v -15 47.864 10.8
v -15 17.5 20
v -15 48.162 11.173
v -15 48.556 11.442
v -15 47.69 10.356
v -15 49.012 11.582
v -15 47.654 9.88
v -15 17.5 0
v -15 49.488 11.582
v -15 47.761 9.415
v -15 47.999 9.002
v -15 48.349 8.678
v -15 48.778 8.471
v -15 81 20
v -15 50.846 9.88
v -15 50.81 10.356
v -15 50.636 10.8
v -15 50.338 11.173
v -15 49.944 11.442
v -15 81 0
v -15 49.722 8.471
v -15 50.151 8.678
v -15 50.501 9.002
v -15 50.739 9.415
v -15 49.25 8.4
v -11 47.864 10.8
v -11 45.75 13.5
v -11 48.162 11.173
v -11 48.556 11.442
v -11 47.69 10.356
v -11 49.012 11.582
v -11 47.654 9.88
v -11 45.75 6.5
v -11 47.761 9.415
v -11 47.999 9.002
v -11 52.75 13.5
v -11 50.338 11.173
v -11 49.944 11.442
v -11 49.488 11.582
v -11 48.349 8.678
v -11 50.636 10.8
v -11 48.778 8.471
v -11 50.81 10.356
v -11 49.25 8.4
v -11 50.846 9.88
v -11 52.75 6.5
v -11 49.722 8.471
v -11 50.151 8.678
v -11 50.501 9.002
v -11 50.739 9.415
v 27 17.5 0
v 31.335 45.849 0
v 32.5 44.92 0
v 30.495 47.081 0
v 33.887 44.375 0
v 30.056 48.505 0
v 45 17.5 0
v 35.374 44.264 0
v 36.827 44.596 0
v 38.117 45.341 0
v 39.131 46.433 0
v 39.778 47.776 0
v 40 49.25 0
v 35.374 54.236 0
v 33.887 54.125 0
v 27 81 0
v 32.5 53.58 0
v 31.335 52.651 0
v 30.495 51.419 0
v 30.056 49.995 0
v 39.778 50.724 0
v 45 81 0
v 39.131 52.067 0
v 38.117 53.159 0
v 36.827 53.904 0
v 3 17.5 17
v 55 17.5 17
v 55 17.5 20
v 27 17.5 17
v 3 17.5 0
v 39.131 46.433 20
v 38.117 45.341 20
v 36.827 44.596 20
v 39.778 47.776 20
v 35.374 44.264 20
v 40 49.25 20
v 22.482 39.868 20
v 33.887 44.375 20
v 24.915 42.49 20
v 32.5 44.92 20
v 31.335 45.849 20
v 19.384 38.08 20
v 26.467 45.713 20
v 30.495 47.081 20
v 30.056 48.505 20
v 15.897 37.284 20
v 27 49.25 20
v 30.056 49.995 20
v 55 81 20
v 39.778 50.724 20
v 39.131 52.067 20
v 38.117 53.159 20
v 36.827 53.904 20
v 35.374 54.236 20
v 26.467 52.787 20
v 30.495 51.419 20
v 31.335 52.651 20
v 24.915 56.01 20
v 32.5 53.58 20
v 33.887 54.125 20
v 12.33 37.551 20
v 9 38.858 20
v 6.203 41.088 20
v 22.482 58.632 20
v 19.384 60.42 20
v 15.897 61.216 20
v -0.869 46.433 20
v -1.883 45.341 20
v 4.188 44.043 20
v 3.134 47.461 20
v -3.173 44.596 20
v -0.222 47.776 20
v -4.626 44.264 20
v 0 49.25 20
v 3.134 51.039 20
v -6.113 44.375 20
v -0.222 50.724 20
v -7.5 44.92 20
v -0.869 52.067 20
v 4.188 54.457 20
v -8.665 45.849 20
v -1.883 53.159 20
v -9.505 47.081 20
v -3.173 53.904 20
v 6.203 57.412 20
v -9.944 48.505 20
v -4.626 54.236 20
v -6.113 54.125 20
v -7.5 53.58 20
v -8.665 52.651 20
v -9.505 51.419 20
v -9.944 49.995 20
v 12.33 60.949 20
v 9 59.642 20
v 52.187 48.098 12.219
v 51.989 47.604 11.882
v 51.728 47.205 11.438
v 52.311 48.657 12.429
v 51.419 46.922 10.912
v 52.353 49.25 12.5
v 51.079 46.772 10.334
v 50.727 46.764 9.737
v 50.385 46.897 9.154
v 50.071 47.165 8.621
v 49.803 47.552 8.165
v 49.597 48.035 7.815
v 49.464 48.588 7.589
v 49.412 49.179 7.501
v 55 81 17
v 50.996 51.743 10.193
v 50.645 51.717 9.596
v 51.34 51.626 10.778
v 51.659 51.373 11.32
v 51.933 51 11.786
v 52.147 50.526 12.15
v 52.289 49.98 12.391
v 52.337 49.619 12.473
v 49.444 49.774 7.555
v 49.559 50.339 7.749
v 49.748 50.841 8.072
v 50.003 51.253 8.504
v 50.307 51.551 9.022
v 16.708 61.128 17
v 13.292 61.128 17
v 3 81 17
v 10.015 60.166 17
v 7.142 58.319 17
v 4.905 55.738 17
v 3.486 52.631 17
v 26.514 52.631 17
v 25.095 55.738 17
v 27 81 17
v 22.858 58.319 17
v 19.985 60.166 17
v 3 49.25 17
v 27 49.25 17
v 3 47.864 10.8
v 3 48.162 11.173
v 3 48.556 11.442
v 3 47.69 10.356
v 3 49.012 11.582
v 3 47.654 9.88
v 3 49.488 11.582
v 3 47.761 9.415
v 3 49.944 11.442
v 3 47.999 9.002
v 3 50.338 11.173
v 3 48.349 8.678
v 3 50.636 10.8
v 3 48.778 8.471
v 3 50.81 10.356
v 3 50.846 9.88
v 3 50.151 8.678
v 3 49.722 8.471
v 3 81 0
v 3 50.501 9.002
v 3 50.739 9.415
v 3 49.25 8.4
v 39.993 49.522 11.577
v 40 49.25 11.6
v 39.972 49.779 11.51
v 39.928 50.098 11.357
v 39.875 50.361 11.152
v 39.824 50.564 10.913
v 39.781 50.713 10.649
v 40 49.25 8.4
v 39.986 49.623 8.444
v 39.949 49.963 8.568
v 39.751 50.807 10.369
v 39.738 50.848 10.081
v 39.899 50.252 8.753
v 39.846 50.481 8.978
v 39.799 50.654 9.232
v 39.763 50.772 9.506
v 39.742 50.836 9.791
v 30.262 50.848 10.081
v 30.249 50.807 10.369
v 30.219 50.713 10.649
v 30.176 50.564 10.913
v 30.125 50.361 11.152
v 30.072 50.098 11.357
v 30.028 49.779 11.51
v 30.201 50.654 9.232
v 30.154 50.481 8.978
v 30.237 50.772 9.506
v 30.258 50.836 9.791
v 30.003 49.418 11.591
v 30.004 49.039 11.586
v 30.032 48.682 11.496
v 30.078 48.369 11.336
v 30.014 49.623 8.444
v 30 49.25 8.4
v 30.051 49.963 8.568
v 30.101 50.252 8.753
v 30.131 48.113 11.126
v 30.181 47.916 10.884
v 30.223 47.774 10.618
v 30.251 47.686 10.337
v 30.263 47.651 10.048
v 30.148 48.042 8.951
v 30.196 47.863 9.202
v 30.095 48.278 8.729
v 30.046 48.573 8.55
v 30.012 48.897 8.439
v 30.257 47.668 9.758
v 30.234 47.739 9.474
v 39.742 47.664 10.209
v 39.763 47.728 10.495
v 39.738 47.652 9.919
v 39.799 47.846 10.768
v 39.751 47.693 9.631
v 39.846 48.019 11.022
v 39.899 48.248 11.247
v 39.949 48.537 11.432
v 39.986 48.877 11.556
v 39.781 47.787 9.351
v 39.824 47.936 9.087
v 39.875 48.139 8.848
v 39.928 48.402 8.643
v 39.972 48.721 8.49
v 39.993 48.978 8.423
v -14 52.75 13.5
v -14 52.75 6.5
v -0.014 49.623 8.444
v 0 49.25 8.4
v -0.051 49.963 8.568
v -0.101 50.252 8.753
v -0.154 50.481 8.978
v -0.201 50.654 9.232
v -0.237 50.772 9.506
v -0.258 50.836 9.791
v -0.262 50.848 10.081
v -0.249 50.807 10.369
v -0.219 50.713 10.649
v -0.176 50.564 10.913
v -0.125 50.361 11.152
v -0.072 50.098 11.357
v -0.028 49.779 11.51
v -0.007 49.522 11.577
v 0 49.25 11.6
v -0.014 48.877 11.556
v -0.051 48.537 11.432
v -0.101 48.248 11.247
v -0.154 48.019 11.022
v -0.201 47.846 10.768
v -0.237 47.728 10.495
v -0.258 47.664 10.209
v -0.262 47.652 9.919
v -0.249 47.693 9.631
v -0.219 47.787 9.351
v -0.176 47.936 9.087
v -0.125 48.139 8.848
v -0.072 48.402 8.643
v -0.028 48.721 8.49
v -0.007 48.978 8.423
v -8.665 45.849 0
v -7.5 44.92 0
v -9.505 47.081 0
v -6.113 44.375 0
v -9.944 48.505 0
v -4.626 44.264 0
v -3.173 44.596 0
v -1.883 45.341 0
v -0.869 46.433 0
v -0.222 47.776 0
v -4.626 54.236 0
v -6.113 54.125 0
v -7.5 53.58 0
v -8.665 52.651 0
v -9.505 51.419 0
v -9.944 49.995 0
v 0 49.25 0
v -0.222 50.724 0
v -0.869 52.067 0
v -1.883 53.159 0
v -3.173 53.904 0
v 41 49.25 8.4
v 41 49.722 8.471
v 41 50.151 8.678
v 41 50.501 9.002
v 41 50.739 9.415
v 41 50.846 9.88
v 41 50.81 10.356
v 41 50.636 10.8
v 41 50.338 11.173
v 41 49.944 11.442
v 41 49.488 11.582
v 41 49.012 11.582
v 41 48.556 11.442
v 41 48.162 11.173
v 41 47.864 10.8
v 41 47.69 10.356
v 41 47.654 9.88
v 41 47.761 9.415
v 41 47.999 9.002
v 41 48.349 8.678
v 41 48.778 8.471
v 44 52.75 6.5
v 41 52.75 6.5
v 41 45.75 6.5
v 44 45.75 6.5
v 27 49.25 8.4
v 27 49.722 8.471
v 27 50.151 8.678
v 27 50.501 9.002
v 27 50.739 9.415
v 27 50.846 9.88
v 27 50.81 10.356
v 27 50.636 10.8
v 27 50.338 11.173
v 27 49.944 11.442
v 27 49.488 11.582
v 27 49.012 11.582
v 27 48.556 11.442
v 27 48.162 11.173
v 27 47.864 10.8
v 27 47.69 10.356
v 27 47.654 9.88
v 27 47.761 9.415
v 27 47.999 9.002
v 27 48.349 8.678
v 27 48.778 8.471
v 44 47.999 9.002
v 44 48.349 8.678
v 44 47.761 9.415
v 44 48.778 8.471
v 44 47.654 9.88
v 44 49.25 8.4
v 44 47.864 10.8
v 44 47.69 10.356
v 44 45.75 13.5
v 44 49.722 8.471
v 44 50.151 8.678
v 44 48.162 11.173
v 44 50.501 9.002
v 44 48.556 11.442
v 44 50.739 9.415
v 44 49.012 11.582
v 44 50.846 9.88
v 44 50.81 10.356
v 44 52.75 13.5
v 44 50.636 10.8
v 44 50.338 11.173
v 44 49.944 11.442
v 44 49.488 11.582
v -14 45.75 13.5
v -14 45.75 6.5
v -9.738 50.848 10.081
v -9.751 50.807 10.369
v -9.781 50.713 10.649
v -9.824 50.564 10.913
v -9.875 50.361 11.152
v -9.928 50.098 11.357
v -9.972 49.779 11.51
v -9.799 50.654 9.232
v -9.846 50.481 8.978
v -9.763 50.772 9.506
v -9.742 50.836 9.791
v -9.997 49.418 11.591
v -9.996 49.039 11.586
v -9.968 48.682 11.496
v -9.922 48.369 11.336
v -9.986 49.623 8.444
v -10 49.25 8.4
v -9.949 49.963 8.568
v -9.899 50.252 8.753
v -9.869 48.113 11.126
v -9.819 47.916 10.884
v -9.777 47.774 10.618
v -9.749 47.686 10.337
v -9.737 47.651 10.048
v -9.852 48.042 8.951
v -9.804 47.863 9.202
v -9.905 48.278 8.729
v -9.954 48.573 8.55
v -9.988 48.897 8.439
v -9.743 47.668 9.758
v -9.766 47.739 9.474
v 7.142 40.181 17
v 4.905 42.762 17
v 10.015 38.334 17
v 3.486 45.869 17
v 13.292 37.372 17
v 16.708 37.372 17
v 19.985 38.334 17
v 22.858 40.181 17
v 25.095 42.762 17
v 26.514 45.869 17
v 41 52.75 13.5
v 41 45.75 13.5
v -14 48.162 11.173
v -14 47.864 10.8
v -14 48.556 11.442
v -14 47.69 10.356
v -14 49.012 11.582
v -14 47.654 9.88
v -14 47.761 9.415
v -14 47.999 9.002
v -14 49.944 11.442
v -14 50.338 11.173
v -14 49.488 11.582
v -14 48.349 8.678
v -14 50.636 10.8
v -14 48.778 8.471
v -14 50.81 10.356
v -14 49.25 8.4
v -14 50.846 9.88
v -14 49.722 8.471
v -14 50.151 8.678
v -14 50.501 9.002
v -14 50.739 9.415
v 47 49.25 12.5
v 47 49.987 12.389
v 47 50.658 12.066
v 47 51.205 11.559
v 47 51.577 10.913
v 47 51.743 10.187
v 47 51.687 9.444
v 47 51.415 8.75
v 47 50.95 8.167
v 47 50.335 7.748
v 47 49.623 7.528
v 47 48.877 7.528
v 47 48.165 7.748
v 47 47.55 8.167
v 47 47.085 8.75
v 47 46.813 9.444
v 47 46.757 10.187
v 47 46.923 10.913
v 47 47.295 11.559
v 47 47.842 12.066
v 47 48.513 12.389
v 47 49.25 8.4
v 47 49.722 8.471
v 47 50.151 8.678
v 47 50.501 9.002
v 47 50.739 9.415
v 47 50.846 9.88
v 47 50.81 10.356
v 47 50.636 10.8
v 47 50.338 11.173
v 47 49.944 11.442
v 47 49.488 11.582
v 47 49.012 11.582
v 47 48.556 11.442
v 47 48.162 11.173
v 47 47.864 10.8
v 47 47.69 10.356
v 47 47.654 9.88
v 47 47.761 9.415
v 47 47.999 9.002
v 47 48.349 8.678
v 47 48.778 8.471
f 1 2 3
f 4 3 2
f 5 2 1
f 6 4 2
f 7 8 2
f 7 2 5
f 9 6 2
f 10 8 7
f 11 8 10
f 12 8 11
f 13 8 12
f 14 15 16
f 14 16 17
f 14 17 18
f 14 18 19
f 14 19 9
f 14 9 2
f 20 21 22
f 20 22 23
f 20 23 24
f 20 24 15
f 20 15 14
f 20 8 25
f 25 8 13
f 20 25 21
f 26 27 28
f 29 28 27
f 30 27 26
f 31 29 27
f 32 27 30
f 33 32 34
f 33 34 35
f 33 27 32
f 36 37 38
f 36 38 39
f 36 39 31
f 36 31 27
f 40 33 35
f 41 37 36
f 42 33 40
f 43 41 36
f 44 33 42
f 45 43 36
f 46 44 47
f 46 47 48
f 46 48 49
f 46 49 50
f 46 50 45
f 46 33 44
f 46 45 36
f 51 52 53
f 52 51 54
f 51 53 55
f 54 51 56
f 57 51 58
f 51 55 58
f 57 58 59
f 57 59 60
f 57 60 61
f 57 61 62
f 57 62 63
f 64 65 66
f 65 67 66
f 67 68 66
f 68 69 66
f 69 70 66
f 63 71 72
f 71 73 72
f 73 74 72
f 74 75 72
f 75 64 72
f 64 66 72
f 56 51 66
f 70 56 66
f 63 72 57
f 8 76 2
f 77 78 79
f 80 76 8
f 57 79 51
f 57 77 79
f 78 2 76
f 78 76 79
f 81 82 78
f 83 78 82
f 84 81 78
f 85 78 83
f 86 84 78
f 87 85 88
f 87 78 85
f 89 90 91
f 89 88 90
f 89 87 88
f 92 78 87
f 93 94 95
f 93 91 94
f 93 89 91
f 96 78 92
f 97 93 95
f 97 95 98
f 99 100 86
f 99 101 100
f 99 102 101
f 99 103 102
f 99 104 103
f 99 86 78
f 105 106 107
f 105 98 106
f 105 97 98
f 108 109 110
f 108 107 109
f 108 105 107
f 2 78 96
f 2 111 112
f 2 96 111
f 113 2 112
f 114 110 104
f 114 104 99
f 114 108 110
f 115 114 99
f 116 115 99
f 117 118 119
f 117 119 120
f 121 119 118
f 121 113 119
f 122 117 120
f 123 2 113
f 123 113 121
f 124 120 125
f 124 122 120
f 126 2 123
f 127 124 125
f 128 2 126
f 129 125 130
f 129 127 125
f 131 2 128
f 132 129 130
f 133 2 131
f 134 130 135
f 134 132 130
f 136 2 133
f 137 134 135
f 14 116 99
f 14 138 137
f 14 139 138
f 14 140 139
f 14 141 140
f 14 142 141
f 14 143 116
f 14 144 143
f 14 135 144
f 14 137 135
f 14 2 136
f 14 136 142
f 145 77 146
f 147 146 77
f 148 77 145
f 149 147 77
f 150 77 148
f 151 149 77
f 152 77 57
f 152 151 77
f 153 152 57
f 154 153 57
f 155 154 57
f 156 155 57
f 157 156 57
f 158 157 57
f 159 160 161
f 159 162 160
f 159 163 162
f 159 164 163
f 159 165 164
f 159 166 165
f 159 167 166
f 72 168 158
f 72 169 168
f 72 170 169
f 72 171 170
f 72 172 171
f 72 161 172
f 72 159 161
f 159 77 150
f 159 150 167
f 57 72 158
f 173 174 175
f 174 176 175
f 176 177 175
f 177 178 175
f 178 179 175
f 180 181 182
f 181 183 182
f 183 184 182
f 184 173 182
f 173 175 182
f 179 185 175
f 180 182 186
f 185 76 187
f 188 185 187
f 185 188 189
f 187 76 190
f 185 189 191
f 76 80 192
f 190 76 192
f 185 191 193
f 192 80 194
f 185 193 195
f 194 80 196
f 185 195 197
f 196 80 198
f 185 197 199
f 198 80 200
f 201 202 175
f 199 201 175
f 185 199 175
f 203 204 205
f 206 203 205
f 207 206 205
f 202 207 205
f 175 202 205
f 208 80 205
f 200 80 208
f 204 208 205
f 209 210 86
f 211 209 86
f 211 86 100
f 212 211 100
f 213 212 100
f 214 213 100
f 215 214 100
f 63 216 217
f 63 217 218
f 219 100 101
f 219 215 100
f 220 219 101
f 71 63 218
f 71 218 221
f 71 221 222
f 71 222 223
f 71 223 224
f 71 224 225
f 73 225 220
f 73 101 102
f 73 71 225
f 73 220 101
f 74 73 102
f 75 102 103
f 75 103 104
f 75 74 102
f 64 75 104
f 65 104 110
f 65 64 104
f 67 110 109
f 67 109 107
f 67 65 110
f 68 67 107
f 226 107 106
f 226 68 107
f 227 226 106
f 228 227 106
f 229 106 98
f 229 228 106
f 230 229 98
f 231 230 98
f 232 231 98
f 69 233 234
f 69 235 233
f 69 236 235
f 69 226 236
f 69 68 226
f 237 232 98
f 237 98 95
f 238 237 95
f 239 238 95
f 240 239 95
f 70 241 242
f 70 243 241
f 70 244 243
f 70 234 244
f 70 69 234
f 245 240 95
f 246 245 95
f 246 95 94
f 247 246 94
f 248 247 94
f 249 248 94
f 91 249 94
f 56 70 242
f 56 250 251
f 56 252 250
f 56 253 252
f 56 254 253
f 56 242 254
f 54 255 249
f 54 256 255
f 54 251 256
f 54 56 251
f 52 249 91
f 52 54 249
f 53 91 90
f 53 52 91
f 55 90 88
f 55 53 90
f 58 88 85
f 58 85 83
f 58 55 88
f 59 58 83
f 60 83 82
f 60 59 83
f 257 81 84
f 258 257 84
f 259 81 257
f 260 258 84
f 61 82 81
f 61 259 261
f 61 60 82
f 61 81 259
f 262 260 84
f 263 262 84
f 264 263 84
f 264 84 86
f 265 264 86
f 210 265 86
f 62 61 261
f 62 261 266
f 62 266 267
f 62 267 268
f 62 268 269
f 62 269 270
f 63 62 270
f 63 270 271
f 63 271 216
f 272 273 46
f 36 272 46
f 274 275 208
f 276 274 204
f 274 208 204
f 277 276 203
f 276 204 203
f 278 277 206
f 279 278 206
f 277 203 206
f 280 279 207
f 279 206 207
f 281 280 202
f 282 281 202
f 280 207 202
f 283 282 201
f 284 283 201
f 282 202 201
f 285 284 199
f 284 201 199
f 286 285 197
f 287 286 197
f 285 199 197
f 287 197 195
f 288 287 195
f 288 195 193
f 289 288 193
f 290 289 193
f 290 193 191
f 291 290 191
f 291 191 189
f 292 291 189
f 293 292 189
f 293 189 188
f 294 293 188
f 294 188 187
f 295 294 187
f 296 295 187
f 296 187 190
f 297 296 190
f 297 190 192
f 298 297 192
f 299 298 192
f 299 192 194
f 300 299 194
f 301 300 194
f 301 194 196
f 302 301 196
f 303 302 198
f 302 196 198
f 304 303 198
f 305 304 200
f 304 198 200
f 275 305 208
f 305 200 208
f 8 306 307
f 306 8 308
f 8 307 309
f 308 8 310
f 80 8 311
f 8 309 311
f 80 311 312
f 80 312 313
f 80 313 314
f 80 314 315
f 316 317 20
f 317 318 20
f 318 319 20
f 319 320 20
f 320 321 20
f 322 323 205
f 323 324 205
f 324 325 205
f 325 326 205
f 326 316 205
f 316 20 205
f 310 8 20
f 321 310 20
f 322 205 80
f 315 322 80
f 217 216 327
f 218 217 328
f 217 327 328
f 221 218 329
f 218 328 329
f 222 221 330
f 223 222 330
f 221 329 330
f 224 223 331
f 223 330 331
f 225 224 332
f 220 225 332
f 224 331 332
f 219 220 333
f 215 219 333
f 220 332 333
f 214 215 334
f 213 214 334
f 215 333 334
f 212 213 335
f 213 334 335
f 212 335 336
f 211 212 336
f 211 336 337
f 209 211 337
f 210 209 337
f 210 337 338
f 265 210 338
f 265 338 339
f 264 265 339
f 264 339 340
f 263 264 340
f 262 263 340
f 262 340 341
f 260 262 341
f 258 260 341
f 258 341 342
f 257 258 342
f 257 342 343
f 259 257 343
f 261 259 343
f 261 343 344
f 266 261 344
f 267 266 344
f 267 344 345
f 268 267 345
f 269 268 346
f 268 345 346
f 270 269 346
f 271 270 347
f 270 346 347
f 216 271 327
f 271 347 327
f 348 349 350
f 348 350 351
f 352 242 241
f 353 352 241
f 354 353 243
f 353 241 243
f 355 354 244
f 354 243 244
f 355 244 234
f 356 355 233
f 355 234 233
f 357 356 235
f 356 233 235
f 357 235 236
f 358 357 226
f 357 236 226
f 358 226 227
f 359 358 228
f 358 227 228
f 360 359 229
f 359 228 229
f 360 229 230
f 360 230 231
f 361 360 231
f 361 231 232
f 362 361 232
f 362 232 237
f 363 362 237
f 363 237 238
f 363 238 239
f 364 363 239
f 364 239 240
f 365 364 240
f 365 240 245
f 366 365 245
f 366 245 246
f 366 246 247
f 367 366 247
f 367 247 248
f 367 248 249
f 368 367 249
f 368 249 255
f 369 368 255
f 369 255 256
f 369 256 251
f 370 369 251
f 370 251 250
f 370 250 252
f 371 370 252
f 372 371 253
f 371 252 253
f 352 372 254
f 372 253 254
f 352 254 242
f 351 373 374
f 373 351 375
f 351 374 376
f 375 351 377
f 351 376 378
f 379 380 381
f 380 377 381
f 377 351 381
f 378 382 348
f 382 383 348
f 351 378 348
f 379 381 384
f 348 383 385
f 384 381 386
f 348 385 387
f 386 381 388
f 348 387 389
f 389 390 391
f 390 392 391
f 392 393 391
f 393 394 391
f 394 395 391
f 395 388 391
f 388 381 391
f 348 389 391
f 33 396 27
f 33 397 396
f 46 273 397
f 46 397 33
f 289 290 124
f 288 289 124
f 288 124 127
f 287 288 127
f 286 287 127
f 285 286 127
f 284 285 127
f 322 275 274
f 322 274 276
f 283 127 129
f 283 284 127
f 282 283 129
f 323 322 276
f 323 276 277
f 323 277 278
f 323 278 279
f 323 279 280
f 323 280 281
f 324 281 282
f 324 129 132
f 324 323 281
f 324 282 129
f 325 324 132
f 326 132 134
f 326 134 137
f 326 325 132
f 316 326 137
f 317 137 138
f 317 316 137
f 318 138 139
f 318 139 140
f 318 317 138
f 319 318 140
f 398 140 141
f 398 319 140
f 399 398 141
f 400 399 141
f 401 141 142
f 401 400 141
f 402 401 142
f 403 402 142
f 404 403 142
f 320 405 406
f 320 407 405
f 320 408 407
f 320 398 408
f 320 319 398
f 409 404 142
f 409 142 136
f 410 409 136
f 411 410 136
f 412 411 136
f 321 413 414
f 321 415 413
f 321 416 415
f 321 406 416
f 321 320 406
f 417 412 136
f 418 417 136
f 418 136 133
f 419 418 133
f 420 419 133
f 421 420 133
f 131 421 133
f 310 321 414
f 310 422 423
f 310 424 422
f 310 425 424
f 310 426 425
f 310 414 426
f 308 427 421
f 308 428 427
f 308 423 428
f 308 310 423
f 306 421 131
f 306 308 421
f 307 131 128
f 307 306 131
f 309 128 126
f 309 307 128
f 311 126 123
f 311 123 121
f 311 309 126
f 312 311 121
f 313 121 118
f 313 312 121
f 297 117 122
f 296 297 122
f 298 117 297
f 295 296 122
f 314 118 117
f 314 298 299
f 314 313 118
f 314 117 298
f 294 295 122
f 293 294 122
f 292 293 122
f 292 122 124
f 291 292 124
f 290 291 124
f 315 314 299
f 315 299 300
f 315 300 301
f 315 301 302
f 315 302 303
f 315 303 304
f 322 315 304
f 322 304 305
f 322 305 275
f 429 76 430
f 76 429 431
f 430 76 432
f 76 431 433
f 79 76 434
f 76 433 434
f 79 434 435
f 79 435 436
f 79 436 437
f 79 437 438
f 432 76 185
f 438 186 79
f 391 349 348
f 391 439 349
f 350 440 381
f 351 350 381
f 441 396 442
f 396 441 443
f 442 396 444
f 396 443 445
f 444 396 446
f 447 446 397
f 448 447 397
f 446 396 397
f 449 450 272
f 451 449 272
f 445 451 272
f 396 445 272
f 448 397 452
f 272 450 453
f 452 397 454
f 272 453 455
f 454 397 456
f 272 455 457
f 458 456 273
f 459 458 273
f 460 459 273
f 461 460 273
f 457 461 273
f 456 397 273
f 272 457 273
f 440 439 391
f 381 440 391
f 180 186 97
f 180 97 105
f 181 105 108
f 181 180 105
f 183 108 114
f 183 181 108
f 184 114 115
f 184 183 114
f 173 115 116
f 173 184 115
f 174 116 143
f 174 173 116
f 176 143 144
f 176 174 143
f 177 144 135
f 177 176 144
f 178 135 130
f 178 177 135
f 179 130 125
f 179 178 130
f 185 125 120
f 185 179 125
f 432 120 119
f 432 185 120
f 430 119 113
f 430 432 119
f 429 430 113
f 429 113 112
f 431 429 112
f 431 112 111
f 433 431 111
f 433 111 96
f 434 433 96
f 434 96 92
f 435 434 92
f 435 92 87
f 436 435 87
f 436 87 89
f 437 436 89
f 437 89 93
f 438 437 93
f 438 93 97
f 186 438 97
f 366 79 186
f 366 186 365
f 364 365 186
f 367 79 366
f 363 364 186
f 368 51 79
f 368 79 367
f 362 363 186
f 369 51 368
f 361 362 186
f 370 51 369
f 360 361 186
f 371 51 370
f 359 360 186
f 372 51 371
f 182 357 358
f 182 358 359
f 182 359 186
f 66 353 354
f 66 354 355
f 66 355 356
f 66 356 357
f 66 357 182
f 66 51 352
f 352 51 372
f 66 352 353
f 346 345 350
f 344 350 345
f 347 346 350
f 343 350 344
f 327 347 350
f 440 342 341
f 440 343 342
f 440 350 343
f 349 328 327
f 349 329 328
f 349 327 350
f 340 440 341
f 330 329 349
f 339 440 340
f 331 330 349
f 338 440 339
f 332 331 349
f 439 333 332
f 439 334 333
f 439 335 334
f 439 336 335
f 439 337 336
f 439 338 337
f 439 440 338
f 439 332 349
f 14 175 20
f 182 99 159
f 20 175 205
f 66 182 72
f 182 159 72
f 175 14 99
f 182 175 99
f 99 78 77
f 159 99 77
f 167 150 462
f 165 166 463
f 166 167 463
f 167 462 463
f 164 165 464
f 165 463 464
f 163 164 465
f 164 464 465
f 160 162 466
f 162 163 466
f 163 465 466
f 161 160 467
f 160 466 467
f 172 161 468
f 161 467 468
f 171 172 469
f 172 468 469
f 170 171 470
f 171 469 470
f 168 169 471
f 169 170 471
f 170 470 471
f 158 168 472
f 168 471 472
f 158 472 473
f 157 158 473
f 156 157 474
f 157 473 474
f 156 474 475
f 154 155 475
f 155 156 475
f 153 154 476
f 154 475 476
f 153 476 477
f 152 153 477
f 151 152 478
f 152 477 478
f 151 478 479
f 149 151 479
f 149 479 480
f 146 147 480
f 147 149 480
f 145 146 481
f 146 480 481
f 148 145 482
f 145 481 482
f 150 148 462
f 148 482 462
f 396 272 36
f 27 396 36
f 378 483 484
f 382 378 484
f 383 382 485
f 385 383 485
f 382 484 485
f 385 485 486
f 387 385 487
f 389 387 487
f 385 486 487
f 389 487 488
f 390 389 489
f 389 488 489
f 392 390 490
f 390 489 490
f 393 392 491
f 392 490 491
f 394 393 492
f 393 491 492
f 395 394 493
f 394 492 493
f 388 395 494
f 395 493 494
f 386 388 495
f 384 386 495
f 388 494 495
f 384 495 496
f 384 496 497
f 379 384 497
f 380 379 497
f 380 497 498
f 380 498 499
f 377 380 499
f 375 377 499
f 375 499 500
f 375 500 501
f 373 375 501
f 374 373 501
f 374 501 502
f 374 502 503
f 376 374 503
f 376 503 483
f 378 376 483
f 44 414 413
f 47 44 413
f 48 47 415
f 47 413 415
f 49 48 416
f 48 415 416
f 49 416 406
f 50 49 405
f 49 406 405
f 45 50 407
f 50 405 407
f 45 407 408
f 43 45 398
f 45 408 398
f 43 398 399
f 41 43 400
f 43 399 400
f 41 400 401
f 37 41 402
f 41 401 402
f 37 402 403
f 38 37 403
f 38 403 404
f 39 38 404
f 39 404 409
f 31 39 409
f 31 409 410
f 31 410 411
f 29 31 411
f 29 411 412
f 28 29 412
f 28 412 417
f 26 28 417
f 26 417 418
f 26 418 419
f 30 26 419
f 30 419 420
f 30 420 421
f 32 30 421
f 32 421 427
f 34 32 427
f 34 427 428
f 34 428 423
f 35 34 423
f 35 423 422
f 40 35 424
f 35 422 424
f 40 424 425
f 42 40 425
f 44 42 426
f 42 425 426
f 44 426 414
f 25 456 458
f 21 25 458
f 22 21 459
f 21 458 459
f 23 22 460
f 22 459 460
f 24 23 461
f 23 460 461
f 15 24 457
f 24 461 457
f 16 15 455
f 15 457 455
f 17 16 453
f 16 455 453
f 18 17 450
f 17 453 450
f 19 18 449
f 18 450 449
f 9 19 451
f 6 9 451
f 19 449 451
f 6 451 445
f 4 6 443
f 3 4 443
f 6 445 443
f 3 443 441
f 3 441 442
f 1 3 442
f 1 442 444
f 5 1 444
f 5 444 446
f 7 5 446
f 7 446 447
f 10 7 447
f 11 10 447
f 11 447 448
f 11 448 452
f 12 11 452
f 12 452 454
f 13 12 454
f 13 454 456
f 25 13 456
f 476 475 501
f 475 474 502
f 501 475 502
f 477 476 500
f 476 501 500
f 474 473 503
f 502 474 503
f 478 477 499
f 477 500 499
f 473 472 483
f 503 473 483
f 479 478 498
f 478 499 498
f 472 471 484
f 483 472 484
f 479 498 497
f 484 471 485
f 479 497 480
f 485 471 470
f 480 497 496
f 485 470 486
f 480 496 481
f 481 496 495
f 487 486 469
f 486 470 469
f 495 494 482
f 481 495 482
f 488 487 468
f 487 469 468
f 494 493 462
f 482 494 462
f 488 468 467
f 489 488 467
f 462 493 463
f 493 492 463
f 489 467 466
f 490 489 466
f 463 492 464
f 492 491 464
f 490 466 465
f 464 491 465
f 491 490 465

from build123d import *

# Parameters (mm, degrees)
SKETCH_1_W          = 18
SKETCH_1_H          = 63.5
SKETCH_1_R          = 5
EXTRUDE_1_DEPTH     = 17
EXTRUDE_1_2_DEPTH   = 17
SKETCH_2_W          = 60
SKETCH_2_H          = 63.5
SKETCH_2_R          = 5
SKETCH_2_R_2        = 12
EXTRUDE_2_DEPTH     = 3
SKETCH_3_W          = 3
SKETCH_3_H          = 63.5
EXTRUDE_3_DEPTH     = 10
RIB_1_REACH         = 88.355
SKETCH_4_WALL_W     = 194.433823758
SKETCH_4_WALL_H     = 63.5
SKETCH_7_W          = 3
SKETCH_7_H          = 7
CUT_EXTRUDE_1_DEPTH = 3.5
HOLE_WIZARD_1_D     = 3.2
SKETCH_13_R         = 2.5
CUT_EXTRUDE_2_DEPTH = 11


with BuildPart() as part:
    # 草图1 → 凸台-拉伸1 (new body)
    with BuildSketch(Plane.XY):
        with Locations((36, 49.25)):
            Rectangle(SKETCH_1_W, SKETCH_1_H)
        with Locations((35, 49.25)):
            Circle(SKETCH_1_R, mode=Mode.SUBTRACT)
    extrude(amount=EXTRUDE_1_DEPTH)



with BuildPart() as body_2:
    # 草图1 → Extrude 1 2 (new body)
    with BuildSketch(Plane.XY):
        with Locations((-6, 49.25)):
            Rectangle(SKETCH_1_W, SKETCH_1_H)
        with Locations((-5, 49.25)):
            Circle(SKETCH_1_R, mode=Mode.SUBTRACT)
    extrude(amount=EXTRUDE_1_2_DEPTH)


with BuildPart() as part_1:
    add(part.part)

    add(body_2.part)  # 凸台-拉伸2 merges body 2
    # 草图2 → 凸台-拉伸2 (add)
    with BuildSketch(Plane.XY.offset(17)):
        with Locations((15, 49.25)):
            Rectangle(SKETCH_2_W, SKETCH_2_H)
        with Locations((35, 49.25)):
            Circle(SKETCH_2_R, mode=Mode.SUBTRACT)
        with Locations((-5, 49.25)):
            Circle(SKETCH_2_R, mode=Mode.SUBTRACT)
        with Locations((15, 49.25)):
            Circle(SKETCH_2_R_2, mode=Mode.SUBTRACT)
    extrude(amount=EXTRUDE_2_DEPTH)

    # 草图3 → 凸台-拉伸3 (add)
    with BuildSketch(Plane(origin=(45, 0, 0), x_dir=(0, 0, -1), z_dir=(1, 0, 0))):
        with Locations((-18.5, 49.25)):
            Rectangle(SKETCH_3_W, SKETCH_3_H)
    extrude(amount=EXTRUDE_3_DEPTH)

    # 草图4 wall → 筋1 (add, up to next)
    with BuildSketch(Plane(origin=(50, 17.5, 8.5), x_dir=(-0.507020126563, 0, -0.861934215158), z_dir=(0.861934215158, 0, -0.507020126563)), mode=Mode.PRIVATE) as rib_1_sk1:
        with Locations((0, 31.75)):
            Rectangle(SKETCH_4_WALL_W, SKETCH_4_WALL_H)
    rib_1_tool1 = extrude(rib_1_sk1.sketch, amount=-RIB_1_REACH, mode=Mode.PRIVATE) - part_1.part
    add(rib_1_tool1.solids().sort_by_distance((50, 17.5, 8.5))[0])

    # 草图7 → 切除-拉伸1 (cut, symmetric)
    with BuildSketch(Plane.XY.offset(10)):
        with Locations((-12.5, 49.25)):
            Rectangle(SKETCH_7_W, SKETCH_7_H)
        with Locations((42.5, 49.25)):
            Rectangle(SKETCH_7_W, SKETCH_7_H)
    extrude(amount=CUT_EXTRUDE_1_DEPTH, both=True, mode=Mode.SUBTRACT)

    # 孔1 (through all)
    with Locations(Plane.ZY.offset(15)):
        with Locations((10, 49.25)):
            Hole(HOLE_WIZARD_1_D / 2)

    # 草图13 → 切除-拉伸2 (cut)
    with BuildSketch(Plane.ZY.offset(-47)):
        with Locations((10, 49.25)):
            Circle(SKETCH_13_R)
    extrude(amount=-CUT_EXTRUDE_2_DEPTH, mode=Mode.SUBTRACT)


solid = part_1.part
